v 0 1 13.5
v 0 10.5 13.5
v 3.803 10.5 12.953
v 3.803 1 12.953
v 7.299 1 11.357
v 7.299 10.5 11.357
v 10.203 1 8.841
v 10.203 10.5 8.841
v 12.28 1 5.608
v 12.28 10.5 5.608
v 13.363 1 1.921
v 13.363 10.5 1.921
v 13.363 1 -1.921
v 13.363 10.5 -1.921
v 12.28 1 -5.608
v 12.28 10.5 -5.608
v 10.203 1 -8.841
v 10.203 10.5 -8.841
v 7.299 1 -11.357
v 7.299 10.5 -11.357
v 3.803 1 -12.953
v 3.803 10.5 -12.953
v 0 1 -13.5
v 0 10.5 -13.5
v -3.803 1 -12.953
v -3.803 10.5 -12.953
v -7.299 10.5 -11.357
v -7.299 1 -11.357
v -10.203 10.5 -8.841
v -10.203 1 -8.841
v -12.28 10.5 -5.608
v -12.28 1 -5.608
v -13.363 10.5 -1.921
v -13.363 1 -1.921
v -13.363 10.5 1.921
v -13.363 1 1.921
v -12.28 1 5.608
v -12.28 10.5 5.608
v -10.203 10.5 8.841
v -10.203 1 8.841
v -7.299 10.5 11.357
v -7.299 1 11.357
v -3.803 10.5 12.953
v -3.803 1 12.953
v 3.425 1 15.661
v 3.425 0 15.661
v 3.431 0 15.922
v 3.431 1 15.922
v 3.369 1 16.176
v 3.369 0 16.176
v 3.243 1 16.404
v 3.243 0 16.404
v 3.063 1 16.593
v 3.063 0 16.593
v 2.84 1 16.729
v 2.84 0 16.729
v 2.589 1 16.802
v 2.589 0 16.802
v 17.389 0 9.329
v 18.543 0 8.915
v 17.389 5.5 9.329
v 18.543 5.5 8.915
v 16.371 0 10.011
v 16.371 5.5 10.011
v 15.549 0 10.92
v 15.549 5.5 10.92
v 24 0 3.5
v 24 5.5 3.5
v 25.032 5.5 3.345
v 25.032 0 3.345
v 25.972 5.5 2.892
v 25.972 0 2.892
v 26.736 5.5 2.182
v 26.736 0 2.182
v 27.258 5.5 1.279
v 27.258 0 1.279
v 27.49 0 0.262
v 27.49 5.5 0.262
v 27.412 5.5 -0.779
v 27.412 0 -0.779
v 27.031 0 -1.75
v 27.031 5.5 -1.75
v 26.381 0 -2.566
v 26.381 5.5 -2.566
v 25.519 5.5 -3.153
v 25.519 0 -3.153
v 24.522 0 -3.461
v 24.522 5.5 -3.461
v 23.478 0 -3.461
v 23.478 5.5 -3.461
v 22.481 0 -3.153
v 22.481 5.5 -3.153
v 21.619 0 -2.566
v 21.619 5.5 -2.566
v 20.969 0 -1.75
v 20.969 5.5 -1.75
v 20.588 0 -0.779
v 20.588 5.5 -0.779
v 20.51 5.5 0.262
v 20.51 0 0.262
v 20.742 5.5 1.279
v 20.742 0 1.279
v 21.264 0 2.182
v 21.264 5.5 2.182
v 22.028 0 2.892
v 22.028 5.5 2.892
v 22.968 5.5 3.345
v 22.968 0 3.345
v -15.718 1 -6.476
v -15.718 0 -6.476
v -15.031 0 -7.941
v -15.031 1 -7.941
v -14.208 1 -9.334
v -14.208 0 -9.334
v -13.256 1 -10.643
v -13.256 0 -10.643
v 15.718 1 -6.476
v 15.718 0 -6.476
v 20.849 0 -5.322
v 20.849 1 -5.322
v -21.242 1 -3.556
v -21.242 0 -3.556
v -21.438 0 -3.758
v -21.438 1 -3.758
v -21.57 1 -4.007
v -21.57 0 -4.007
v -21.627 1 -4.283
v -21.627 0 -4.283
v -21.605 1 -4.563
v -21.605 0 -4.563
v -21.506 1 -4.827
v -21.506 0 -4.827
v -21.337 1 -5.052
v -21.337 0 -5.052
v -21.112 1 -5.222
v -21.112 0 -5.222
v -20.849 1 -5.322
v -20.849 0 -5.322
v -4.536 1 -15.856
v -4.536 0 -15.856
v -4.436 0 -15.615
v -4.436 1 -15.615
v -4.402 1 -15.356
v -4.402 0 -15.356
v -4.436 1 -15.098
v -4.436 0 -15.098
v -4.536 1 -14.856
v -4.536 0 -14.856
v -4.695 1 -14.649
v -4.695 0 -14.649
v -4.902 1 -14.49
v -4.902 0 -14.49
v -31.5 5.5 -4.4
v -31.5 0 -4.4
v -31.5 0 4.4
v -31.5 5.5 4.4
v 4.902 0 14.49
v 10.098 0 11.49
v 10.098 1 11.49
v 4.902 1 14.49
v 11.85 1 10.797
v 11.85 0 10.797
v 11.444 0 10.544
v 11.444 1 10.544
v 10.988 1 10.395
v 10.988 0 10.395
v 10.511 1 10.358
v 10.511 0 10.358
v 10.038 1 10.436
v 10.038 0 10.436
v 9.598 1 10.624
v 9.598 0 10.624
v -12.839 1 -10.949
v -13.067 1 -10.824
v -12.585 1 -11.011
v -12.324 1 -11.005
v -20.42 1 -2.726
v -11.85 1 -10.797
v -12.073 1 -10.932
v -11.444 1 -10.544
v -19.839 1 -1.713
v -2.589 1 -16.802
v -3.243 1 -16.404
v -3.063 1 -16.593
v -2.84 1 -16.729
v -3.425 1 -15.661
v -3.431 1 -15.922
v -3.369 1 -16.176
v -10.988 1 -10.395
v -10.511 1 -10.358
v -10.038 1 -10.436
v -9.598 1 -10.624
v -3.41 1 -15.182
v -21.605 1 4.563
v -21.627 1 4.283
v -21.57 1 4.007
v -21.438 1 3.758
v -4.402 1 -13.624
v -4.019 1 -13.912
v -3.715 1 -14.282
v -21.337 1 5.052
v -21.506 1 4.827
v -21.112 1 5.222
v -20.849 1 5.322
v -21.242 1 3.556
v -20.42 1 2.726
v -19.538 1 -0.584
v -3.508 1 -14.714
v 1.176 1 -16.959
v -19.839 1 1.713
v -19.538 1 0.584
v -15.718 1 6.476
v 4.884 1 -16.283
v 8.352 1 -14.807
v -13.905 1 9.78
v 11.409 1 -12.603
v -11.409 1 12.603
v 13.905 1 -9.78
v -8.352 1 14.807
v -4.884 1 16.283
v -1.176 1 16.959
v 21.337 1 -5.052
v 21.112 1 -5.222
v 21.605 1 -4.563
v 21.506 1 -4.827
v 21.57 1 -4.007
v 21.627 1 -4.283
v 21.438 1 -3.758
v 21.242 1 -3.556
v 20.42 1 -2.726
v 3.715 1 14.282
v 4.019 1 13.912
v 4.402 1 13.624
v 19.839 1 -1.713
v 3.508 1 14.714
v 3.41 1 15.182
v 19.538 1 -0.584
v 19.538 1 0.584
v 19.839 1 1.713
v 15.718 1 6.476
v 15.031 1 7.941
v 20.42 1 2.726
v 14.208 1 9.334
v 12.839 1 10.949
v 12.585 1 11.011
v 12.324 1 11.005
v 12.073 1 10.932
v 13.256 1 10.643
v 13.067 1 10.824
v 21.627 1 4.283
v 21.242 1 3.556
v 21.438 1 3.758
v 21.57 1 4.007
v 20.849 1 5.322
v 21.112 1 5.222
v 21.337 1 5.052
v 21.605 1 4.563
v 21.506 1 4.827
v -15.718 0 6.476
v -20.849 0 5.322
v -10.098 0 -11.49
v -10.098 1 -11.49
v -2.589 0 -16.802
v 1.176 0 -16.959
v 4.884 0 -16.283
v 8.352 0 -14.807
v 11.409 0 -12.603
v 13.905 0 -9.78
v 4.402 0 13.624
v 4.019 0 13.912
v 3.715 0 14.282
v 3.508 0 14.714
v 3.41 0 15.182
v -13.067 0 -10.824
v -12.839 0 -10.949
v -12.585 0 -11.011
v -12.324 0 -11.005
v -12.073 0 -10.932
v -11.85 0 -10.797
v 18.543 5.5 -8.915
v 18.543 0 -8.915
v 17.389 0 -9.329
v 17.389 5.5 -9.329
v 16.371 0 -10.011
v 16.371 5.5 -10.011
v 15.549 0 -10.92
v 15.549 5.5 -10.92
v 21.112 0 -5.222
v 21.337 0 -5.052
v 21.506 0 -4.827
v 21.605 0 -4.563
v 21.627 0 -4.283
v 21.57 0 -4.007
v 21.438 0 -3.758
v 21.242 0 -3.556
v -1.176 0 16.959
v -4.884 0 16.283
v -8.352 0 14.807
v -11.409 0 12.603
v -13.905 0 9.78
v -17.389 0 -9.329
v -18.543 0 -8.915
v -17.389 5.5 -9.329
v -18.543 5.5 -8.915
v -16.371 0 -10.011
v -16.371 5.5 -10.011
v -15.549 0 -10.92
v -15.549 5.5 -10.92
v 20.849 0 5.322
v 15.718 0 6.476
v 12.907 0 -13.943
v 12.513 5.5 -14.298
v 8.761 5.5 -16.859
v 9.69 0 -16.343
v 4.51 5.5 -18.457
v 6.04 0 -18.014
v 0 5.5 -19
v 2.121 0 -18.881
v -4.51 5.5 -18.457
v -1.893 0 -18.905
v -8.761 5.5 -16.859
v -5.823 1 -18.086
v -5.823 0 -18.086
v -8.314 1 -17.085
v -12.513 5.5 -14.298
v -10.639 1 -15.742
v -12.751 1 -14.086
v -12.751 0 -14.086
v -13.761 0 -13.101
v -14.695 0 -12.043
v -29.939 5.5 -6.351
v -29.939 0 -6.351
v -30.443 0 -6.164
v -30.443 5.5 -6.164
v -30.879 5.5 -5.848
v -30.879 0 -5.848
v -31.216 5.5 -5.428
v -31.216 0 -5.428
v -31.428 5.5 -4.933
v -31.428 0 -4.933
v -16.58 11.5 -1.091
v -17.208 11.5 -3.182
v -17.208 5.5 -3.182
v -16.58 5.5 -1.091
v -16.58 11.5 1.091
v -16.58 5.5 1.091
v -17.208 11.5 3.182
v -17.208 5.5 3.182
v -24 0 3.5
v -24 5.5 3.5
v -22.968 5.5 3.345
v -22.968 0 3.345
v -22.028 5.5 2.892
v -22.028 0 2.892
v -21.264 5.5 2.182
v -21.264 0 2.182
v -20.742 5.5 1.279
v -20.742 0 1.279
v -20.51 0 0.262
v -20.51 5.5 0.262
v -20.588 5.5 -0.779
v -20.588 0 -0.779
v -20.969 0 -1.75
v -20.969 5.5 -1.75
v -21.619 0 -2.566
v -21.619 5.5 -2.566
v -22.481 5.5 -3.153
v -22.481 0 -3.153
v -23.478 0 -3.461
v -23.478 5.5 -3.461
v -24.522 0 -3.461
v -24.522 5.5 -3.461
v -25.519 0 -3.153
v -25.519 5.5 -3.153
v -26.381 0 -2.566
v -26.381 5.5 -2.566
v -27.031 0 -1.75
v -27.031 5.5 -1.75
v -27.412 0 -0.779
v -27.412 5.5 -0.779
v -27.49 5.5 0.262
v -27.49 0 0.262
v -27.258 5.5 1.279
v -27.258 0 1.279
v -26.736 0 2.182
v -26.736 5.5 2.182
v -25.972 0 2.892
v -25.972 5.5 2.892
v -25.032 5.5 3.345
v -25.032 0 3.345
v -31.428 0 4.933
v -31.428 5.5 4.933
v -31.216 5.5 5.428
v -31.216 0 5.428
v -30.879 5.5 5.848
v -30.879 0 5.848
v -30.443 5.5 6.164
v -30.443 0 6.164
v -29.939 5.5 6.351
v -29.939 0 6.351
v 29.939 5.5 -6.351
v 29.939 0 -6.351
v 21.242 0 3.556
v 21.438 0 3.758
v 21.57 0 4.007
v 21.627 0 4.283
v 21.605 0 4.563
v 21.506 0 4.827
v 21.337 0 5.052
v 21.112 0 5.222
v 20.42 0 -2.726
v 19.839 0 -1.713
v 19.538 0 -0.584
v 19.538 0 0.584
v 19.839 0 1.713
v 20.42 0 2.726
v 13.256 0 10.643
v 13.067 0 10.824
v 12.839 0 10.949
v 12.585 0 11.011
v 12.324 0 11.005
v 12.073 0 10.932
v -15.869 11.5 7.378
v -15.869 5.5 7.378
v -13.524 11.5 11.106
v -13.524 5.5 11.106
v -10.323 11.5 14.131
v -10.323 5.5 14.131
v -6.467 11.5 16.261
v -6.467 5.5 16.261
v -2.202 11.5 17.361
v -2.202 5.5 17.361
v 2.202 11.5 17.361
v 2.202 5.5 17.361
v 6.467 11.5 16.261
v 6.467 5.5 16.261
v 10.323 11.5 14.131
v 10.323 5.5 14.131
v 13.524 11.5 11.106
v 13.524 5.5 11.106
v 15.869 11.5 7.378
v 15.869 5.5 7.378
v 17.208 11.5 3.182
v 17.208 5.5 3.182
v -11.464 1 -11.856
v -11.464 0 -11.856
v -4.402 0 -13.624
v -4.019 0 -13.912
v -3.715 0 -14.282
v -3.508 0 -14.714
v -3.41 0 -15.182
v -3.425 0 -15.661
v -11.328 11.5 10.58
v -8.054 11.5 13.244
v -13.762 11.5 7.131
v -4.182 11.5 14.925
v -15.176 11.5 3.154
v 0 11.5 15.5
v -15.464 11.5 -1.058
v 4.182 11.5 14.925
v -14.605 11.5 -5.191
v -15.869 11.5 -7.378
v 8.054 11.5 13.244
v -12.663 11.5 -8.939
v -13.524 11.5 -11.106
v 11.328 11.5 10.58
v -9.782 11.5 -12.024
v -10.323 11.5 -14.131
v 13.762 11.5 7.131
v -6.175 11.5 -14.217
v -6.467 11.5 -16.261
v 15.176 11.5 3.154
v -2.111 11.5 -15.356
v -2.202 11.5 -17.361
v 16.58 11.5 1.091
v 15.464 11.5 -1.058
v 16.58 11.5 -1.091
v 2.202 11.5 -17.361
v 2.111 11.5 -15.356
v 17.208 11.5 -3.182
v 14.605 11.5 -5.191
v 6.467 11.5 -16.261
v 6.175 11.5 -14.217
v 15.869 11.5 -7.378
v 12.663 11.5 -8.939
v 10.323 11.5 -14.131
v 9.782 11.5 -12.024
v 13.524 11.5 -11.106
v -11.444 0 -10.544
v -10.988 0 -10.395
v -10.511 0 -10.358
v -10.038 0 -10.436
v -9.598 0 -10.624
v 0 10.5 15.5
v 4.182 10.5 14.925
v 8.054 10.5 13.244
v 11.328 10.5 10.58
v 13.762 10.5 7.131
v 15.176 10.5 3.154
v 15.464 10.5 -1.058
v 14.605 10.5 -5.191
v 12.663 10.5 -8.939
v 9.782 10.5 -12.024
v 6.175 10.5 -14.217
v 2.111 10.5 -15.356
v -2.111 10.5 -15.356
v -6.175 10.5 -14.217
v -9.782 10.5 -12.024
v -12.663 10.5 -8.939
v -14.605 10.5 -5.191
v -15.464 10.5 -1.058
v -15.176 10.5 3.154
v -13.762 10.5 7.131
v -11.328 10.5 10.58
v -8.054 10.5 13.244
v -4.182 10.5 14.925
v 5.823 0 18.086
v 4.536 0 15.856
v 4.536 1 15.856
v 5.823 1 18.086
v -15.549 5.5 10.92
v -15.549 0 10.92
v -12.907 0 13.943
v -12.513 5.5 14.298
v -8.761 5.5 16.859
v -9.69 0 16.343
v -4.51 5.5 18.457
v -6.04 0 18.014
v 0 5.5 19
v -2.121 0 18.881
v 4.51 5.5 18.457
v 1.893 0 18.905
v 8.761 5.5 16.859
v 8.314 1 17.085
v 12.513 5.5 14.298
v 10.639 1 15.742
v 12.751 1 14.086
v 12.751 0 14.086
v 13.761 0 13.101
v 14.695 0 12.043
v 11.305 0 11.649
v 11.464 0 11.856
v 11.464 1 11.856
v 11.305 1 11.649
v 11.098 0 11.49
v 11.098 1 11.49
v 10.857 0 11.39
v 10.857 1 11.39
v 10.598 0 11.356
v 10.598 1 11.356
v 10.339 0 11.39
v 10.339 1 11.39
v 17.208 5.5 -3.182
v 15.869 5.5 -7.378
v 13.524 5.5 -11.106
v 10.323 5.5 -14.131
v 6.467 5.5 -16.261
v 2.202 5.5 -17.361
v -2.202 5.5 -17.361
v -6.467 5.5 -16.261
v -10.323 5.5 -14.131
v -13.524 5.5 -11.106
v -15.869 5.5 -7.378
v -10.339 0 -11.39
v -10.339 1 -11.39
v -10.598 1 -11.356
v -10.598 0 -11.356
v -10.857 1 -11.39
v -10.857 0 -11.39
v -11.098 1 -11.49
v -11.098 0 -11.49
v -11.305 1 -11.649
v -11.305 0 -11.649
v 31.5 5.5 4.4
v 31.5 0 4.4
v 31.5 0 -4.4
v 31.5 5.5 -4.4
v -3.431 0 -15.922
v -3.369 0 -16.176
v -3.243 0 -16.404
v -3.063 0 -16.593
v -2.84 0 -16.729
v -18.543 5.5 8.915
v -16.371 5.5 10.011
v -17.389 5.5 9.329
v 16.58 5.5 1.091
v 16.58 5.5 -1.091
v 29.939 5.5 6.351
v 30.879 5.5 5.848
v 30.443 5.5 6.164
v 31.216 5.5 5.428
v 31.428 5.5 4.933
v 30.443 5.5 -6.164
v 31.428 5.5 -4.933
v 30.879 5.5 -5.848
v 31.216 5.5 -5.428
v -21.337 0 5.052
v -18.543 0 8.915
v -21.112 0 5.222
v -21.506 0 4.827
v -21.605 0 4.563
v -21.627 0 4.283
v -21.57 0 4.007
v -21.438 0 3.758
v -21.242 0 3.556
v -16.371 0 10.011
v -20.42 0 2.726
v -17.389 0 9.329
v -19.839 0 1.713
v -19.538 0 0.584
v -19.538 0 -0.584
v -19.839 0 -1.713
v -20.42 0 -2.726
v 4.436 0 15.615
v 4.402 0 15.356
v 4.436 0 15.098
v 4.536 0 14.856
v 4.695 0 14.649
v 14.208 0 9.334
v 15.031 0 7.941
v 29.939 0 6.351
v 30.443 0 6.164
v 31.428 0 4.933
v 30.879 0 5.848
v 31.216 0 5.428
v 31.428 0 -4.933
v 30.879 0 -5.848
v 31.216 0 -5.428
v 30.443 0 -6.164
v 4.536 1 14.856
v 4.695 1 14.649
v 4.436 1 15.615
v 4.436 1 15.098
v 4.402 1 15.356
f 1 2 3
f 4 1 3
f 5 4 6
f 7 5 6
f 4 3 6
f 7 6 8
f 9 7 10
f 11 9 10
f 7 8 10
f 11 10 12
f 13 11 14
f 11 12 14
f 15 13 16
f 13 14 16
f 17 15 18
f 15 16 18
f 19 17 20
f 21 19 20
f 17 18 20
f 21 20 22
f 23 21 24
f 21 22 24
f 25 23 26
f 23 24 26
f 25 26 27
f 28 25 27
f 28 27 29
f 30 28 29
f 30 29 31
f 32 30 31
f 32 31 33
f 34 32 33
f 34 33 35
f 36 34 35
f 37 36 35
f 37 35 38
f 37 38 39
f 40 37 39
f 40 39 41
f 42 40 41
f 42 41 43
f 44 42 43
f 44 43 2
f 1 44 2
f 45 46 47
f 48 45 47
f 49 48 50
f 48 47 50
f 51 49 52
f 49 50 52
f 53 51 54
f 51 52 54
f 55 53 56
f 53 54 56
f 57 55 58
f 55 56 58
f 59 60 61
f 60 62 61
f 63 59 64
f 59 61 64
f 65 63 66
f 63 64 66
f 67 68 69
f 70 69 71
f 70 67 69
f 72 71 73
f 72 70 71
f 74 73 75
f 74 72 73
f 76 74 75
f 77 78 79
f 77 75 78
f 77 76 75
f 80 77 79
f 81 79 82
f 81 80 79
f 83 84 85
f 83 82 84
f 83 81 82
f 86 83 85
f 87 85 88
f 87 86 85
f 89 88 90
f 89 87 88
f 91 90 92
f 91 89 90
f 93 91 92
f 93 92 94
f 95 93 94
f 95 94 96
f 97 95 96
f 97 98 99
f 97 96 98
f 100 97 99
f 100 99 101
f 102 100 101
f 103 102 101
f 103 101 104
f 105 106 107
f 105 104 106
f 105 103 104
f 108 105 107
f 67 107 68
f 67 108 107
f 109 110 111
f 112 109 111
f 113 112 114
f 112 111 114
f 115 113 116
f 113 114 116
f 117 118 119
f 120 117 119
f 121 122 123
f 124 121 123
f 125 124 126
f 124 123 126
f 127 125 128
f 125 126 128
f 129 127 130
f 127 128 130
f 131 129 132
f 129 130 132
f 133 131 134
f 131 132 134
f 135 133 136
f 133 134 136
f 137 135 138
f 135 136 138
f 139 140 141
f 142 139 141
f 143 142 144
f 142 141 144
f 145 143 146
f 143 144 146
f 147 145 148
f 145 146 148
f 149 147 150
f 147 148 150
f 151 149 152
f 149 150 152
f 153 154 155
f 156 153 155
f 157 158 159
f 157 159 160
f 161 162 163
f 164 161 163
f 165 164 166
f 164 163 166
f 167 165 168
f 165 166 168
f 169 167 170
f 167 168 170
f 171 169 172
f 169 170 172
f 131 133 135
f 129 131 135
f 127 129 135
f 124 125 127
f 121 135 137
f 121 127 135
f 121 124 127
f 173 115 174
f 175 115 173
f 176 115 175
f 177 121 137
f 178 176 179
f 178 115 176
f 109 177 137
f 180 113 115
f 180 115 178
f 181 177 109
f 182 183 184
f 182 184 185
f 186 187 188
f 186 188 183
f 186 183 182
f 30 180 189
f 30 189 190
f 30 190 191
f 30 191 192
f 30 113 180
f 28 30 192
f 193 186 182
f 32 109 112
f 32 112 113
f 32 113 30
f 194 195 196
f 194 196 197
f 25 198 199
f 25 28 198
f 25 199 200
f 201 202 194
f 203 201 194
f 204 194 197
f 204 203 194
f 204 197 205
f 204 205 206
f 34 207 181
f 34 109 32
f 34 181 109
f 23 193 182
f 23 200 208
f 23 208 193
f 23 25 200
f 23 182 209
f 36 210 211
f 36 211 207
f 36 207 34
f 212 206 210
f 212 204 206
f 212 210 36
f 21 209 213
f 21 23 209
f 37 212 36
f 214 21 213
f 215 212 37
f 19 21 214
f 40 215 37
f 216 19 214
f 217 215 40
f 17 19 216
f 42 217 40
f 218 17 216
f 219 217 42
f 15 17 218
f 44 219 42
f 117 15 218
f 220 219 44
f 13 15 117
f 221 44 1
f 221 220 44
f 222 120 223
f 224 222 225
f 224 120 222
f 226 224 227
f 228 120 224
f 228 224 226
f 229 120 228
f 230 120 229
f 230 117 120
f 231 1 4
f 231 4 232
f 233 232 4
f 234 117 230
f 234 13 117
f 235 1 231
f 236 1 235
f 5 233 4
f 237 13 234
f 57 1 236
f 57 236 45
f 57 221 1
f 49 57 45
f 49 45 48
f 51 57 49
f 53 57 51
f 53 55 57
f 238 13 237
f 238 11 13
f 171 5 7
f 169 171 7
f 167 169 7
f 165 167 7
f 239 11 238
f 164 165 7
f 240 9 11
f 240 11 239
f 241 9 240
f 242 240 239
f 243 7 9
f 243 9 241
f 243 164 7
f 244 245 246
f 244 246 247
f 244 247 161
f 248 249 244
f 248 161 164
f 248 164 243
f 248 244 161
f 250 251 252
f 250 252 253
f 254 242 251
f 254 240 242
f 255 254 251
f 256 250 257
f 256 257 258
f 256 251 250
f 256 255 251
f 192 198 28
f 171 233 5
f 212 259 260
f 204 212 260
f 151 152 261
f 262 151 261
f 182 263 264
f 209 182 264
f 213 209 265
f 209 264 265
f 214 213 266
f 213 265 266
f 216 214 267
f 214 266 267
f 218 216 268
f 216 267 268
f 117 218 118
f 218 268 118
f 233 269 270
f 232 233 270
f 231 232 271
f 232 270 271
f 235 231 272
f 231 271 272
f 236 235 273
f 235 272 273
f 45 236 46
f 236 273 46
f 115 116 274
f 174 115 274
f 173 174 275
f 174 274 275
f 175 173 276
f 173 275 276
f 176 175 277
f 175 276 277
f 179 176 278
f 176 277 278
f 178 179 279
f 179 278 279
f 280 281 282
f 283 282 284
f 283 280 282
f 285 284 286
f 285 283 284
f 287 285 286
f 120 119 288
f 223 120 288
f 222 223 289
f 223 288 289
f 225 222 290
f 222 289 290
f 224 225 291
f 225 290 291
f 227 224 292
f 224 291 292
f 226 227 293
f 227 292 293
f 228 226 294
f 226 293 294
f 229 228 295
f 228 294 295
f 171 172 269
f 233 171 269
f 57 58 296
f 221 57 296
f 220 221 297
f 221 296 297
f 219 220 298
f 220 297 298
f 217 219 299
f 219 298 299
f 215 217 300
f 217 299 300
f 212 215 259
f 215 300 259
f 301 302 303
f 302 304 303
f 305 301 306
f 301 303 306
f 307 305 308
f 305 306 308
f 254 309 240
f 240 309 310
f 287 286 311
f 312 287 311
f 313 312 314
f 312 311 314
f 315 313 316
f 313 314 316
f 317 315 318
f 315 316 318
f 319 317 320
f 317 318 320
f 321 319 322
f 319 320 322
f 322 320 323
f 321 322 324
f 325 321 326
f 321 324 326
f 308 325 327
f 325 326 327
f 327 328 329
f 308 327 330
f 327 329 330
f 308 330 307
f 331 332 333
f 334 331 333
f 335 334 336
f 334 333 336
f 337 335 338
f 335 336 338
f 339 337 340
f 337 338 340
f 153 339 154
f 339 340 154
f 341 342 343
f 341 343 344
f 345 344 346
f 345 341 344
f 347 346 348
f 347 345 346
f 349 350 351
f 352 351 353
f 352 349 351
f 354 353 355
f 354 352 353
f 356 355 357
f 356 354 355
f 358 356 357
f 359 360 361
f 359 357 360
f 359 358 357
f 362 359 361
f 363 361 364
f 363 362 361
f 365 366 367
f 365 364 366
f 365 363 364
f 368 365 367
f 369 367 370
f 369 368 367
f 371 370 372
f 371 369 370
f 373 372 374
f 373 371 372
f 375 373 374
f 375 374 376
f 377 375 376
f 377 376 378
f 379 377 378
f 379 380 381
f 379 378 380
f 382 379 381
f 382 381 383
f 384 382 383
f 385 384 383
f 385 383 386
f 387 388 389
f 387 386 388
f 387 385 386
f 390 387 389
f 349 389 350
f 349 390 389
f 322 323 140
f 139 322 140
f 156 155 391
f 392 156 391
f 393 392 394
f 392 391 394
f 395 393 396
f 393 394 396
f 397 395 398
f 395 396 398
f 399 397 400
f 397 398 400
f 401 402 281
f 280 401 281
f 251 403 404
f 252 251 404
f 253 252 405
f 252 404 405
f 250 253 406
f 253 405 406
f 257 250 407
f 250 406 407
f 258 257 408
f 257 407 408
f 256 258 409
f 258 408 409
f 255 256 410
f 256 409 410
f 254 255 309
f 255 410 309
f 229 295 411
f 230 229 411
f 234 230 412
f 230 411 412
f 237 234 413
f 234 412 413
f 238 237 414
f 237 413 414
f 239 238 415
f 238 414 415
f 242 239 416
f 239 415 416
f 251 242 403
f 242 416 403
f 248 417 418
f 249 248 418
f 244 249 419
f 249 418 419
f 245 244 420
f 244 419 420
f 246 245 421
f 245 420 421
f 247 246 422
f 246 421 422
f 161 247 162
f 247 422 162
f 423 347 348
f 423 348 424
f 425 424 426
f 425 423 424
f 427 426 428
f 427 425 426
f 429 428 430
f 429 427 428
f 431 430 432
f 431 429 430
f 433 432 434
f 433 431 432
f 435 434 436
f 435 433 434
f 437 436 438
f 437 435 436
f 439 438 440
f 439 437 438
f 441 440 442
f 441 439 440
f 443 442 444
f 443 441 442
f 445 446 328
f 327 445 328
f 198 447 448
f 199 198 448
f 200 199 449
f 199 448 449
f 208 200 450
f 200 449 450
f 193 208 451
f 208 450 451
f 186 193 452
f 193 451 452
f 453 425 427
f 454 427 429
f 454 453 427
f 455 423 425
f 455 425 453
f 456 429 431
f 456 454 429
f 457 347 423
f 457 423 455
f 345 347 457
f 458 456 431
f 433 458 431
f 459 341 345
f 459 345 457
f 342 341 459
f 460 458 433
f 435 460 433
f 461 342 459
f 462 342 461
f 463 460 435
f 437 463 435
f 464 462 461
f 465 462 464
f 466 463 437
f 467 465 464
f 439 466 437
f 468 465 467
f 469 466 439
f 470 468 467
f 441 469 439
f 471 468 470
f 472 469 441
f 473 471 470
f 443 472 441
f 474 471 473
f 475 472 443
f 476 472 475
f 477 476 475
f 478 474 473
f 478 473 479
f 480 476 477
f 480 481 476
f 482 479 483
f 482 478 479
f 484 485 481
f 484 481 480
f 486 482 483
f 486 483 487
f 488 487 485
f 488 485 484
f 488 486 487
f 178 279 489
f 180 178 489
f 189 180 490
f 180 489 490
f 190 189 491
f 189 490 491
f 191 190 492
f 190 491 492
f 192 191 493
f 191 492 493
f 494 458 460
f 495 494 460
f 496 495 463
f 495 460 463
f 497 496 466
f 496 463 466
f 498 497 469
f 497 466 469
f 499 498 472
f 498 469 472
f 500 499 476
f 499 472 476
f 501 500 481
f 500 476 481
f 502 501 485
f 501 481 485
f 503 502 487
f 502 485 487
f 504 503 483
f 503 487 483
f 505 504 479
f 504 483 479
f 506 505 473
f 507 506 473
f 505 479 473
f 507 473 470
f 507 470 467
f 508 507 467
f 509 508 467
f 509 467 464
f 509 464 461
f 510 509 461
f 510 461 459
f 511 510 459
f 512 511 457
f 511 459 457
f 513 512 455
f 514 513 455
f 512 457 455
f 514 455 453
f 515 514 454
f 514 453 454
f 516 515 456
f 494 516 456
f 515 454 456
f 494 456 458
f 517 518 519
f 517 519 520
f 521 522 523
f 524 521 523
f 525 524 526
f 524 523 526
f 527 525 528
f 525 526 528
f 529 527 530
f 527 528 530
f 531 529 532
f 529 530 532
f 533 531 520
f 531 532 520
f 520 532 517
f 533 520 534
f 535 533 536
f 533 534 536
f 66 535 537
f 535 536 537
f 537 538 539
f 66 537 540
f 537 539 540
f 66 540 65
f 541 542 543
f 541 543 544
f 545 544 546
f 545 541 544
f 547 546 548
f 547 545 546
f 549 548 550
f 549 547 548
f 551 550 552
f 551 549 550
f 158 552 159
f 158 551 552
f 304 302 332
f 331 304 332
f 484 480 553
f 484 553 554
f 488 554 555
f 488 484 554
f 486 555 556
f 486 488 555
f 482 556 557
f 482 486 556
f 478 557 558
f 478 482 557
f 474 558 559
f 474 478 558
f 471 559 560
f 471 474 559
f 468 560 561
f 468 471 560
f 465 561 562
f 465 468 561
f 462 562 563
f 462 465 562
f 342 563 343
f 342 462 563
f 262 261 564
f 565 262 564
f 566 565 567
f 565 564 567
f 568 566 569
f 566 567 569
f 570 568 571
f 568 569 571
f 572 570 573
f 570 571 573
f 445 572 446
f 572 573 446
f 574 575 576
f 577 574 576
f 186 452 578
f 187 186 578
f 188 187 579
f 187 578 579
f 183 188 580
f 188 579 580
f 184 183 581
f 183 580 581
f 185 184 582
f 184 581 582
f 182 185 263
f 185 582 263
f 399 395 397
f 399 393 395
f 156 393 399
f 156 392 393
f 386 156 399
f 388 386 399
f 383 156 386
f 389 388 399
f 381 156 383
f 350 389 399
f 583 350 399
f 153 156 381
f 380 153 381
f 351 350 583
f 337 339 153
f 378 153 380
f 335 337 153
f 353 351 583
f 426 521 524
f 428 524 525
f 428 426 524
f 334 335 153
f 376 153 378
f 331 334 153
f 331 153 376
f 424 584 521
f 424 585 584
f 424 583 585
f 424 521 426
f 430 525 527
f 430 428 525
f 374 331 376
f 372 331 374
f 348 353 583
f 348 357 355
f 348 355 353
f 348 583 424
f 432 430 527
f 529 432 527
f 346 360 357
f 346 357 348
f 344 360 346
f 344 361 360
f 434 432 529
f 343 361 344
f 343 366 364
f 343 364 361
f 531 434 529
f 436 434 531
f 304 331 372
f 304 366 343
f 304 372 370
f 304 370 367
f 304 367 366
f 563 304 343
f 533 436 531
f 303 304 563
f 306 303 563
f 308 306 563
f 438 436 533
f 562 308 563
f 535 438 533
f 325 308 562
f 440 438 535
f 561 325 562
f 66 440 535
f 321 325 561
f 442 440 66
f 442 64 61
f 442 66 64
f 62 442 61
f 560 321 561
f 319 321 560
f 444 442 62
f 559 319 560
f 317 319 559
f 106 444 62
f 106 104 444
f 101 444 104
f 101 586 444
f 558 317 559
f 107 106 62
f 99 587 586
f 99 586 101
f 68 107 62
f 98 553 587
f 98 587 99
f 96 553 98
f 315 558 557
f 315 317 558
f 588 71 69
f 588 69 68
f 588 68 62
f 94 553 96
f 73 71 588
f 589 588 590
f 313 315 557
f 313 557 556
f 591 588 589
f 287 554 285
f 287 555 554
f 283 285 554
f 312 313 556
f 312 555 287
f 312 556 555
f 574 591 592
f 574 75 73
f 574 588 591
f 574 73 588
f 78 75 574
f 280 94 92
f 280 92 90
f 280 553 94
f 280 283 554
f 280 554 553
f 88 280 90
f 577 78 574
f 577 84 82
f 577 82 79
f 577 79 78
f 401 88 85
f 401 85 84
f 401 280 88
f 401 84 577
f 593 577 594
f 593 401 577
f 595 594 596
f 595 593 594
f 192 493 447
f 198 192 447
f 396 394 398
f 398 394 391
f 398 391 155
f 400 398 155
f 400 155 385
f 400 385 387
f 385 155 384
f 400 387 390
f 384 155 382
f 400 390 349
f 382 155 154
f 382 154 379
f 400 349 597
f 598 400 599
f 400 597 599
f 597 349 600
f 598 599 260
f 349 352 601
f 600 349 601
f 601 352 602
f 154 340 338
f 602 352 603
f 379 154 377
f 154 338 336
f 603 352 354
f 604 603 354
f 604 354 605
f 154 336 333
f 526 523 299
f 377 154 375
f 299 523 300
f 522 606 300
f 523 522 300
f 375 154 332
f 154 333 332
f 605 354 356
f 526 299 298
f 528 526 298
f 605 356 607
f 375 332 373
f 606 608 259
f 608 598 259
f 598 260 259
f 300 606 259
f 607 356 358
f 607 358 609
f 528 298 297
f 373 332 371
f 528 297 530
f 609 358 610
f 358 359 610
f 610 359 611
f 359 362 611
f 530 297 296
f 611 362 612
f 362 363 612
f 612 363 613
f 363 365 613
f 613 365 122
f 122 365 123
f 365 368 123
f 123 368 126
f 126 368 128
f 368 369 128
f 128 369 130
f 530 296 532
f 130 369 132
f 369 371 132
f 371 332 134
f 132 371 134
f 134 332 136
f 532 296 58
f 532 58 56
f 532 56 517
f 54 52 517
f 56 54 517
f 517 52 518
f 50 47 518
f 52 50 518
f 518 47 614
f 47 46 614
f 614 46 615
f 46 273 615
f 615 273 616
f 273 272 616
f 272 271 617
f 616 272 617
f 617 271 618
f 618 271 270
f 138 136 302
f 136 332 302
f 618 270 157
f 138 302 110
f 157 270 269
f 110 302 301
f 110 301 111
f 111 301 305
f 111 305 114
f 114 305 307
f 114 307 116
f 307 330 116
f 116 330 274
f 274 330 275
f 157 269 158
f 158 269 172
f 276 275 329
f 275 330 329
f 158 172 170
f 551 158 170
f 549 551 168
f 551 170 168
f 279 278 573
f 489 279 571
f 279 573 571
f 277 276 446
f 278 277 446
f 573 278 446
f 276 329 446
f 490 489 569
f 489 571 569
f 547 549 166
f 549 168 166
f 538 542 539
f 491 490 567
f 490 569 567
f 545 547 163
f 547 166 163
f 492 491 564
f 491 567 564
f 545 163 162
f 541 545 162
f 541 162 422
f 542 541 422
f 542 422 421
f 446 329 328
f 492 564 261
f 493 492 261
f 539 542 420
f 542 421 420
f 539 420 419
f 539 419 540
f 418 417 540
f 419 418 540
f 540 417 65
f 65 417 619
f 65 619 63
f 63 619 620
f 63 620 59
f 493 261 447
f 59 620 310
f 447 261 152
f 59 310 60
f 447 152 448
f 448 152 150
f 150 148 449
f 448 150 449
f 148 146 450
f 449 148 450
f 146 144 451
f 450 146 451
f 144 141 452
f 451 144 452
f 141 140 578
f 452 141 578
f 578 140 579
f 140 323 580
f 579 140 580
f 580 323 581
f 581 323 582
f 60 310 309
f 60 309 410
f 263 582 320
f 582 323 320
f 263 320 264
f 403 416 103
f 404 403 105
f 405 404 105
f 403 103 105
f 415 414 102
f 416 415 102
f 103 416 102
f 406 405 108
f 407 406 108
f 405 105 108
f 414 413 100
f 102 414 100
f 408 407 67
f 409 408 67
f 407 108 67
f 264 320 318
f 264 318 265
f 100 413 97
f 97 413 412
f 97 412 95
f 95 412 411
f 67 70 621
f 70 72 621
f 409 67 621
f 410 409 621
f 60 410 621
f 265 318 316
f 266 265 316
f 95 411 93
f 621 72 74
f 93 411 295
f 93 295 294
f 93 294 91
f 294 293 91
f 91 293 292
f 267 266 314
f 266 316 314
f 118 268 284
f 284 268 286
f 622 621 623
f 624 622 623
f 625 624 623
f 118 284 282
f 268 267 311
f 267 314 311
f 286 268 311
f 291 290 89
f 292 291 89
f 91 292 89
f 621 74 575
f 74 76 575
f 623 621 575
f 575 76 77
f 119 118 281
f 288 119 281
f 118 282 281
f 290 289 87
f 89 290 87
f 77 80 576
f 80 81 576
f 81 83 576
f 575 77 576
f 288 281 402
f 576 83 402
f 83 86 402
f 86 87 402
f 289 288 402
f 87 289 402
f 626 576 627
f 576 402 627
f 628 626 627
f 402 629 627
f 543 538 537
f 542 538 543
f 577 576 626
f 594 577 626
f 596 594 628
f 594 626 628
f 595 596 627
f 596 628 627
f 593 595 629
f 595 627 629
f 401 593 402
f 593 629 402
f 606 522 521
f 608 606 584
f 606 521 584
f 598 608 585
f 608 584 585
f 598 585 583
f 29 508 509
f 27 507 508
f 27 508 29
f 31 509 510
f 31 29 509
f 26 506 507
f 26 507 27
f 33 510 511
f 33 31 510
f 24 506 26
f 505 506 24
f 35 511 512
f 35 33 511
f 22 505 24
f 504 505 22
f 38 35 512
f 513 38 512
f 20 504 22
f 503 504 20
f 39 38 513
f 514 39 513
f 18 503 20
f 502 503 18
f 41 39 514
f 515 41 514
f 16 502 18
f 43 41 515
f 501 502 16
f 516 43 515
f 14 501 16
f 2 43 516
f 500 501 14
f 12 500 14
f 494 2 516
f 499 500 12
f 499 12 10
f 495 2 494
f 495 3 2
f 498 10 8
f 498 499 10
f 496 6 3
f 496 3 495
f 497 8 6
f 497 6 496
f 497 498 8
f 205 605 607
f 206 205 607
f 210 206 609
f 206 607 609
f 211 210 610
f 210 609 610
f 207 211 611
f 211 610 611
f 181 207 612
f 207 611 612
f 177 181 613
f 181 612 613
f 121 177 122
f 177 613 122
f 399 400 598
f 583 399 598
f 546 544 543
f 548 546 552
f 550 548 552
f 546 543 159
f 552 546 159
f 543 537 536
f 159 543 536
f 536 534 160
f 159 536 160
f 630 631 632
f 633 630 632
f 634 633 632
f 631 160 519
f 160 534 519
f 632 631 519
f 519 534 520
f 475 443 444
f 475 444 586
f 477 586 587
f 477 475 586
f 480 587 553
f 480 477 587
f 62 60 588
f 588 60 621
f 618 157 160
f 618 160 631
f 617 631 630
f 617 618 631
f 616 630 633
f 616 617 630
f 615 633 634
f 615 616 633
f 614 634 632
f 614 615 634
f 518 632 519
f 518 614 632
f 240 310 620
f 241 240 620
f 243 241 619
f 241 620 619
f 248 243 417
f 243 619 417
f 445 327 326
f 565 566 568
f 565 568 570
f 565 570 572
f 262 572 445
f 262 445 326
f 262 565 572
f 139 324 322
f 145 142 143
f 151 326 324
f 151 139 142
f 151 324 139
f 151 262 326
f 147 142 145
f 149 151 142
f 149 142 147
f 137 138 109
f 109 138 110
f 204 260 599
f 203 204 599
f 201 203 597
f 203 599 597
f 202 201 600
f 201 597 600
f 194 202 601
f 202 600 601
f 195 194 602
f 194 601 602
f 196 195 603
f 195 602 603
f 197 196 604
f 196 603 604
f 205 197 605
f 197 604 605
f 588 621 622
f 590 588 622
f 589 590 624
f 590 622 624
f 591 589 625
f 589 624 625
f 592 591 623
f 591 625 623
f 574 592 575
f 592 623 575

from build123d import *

# Parameters (mm, degrees)
SKETCH_1_R          = 3.5
SKETCH_1_R_2        = 19
EXTRUDE_1_DEPTH     = 11.5
SKETCH_2_R          = 42.113859259
CUT_EXTRUDE_1_DEPTH = 6
SKETCH_3_R          = 15.5
CUT_EXTRUDE_3_DEPTH = 1
CUT_EXTRUDE_4_DEPTH = 1
FILLET_1_R          = 5
SKETCH_5_R          = 13.5
CUT_EXTRUDE_6_DEPTH = 21


with BuildPart() as part:
    # Эскиз1 → Бобышка-Вытянуть1 (new body)
    # profile 1 of 3: a face of its own
    with BuildSketch(Plane(origin=(0, 0, 0), x_dir=(1, 0, 0), z_dir=(0, 1, 0))):
        with BuildLine():
            ThreePointArc((-29.93902439, 6.351219512), (-31.061737619, 5.649390095), (-31.5, 4.4))
            Line((-31.5, 4.4), (-31.5, -4.4))
            ThreePointArc((-31.5, -4.4), (-31.061737619, -5.649390095), (-29.93902439, -6.351219512))
            Line((-29.93902439, -6.351219512), (-16.529826375, -9.368289066))
            ThreePointArc((-16.529826375, -9.368289066), (-19, 0), (-16.529826375, 9.368289066))
            Line((-16.529826375, 9.368289066), (-29.93902439, 6.351219512))
        make_face()
        with Locations(Location((-24, 0, 0), (0, 0, 270))):
            Circle(SKETCH_1_R, mode=Mode.SUBTRACT)
    # profile 2 of 3: a face of its own
    with BuildSketch(Plane(origin=(0, 0, 0), x_dir=(1, 0, 0), z_dir=(0, 1, 0))):
        Circle(SKETCH_1_R_2)
    # profile 3 of 3: a face of its own
    with BuildSketch(Plane(origin=(0, 0, 0), x_dir=(1, 0, 0), z_dir=(0, 1, 0))):
        with BuildLine():
            Line((29.93902439, 6.351219512), (16.529826375, 9.368289066))
            ThreePointArc((16.529826375, 9.368289066), (18.372080736, 4.844238788), (19, 0))
            ThreePointArc((19, 0), (18.372080736, -4.844238788), (16.529826375, -9.368289066))
            Line((16.529826375, -9.368289066), (29.93902439, -6.351219512))
            ThreePointArc((29.93902439, -6.351219512), (31.061737619, -5.649390095), (31.5, -4.4))
            Line((31.5, -4.4), (31.5, 4.4))
            ThreePointArc((31.5, 4.4), (31.061737619, 5.649390095), (29.93902439, 6.351219512))
        make_face()
        with Locations(Location((24, 0, 0), (0, 0, 270))):
            Circle(SKETCH_1_R, mode=Mode.SUBTRACT)
    extrude(amount=EXTRUDE_1_DEPTH)

    # Эскиз2 → Вырез-Вытянуть1 (cut)
    with BuildSketch(Plane(origin=(0, 11.5, 0), x_dir=(1, 0, 0), z_dir=(0, 1, 0))):
        Circle(SKETCH_2_R)
        with BuildLine():
            ThreePointArc((17.208333333, 3.1817077), (0, 17.5), (-17.208333333, 3.1817077))
            ThreePointArc((-17.208333333, 3.1817077), (-16.5, 0), (-17.208333333, -3.1817077))
            ThreePointArc((-17.208333333, -3.1817077), (0, -17.5), (17.208333333, -3.1817077))
            ThreePointArc((17.208333333, -3.1817077), (16.5, 0), (17.208333333, 3.1817077))
        make_face(mode=Mode.SUBTRACT)
    extrude(amount=-CUT_EXTRUDE_1_DEPTH, mode=Mode.SUBTRACT)

    # Эскиз3 → Вырез-Вытянуть3 (cut)
    with BuildSketch(Plane(origin=(0, 11.5, 0), x_dir=(1, 0, 0), z_dir=(0, 1, 0))):
        with Locations(Location((0, 0, 0), (0, 0, 270))):
            Circle(SKETCH_3_R)
    extrude(amount=-CUT_EXTRUDE_3_DEPTH, mode=Mode.SUBTRACT)

    # Эскиз4 → Вырез-Вытянуть4 (cut)
    with BuildSketch(Plane.XZ):
        with BuildLine():
            Line((-20.848643232, -5.321555273), (-15.718229563, -6.475898348))
            ThreePointArc((-15.718229563, -6.475898348), (-14.636214456, -8.647613914), (-13.256050789, -10.643172341))
            ThreePointArc((-13.256050789, -10.643172341), (-12.584964511, -11.011180012), (-11.850214134, -10.796871074))
            ThreePointArc((-11.850214134, -10.796871074), (-10.750830182, -10.362248437), (-9.598076211, -10.624355653))
            Line((-9.598076211, -10.624355653), (-4.401923789, -13.624355653))
            ThreePointArc((-4.401923789, -13.624355653), (-3.598555295, -14.491616268), (-3.425257564, -15.661022017))
            ThreePointArc((-3.425257564, -15.661022017), (-3.243479361, -16.404488978), (-2.58923223, -16.801662908))
            ThreePointArc((-2.58923223, -16.801662908), (8.351526577, -14.807160559), (15.718229563, -6.475898348))
            Line((15.718229563, -6.475898348), (20.848643232, -5.321555273))
            ThreePointArc((20.848643232, -5.321555273), (21.605203579, -4.563390663), (21.242016303, -3.555773605))
            ThreePointArc((21.242016303, -3.555773605), (19.5, 0), (21.242016303, 3.555773605))
            ThreePointArc((21.242016303, 3.555773605), (21.605203579, 4.563390663), (20.848643232, 5.321555273))
            Line((20.848643232, 5.321555273), (15.718229563, 6.475898348))
            ThreePointArc((15.718229563, 6.475898348), (14.636214456, 8.647613914), (13.256050789, 10.643172341))
            ThreePointArc((13.256050789, 10.643172341), (12.584964511, 11.011180012), (11.850214134, 10.796871074))
            ThreePointArc((11.850214134, 10.796871074), (10.750830182, 10.362248437), (9.598076211, 10.624355653))
            Line((9.598076211, 10.624355653), (4.401923789, 13.624355653))
            ThreePointArc((4.401923789, 13.624355653), (3.598555295, 14.491616268), (3.425257564, 15.661022017))
            ThreePointArc((3.425257564, 15.661022017), (3.243479361, 16.404488978), (2.58923223, 16.801662908))
            ThreePointArc((2.58923223, 16.801662908), (-8.351526577, 14.807160559), (-15.718229563, 6.475898348))
            Line((-15.718229563, 6.475898348), (-20.848643232, 5.321555273))
            ThreePointArc((-20.848643232, 5.321555273), (-21.605203579, 4.563390663), (-21.242016303, 3.555773605))
            ThreePointArc((-21.242016303, 3.555773605), (-19.5, 0), (-21.242016303, -3.555773605))
            ThreePointArc((-21.242016303, -3.555773605), (-21.605203579, -4.563390663), (-20.848643232, -5.321555273))
        make_face()
        with BuildLine():
            Line((6.035898385, 18.454482672), (12.964101615, 14.454482672))
            Line((12.964101615, 14.454482672), (11.464101615, 11.856406461))
            ThreePointArc((11.464101615, 11.856406461), (10.856895256, 11.390480634), (10.098076211, 11.490381057))
            Line((10.098076211, 11.490381057), (4.901923789, 14.490381057))
            ThreePointArc((4.901923789, 14.490381057), (4.435997962, 15.097587415), (4.535898385, 15.856406461))
            Line((4.535898385, 15.856406461), (6.035898385, 18.454482672))
        make_face()
        with BuildLine():
            Line((-6.035898385, -18.454482672), (-4.535898385, -15.856406461))
            ThreePointArc((-4.535898385, -15.856406461), (-4.435997962, -15.097587415), (-4.901923789, -14.490381057))
            Line((-4.901923789, -14.490381057), (-10.098076211, -11.490381057))
            ThreePointArc((-10.098076211, -11.490381057), (-10.856895256, -11.390480634), (-11.464101615, -11.856406461))
            Line((-11.464101615, -11.856406461), (-12.964101615, -14.454482672))
            Line((-12.964101615, -14.454482672), (-6.035898385, -18.454482672))
        make_face()
    extrude(amount=-CUT_EXTRUDE_4_DEPTH, mode=Mode.SUBTRACT)

    # Скругление1
    fillet_1_edges = [part.edges().sort_by_distance(p)[0] for p in [
        (-16.529826375, 2.75, -9.368289066),
        (16.529826375, 2.75, -9.368289066),
        (16.529826375, 2.75, 9.368289066),
        (-16.529826375, 2.75, 9.368289066),
    ]]
    fillet(fillet_1_edges, radius=FILLET_1_R)

    # Эскиз5 → Вырез-Вытянуть6 (cut)
    with BuildSketch(Plane(origin=(0, 10.5, 0), x_dir=(1, 0, 0), z_dir=(0, 1, 0))):
        with Locations(Location((0, 0, 0), (0, 0, 270))):
            Circle(SKETCH_5_R)
    extrude(amount=-CUT_EXTRUDE_6_DEPTH, mode=Mode.SUBTRACT)


solid = part.part
